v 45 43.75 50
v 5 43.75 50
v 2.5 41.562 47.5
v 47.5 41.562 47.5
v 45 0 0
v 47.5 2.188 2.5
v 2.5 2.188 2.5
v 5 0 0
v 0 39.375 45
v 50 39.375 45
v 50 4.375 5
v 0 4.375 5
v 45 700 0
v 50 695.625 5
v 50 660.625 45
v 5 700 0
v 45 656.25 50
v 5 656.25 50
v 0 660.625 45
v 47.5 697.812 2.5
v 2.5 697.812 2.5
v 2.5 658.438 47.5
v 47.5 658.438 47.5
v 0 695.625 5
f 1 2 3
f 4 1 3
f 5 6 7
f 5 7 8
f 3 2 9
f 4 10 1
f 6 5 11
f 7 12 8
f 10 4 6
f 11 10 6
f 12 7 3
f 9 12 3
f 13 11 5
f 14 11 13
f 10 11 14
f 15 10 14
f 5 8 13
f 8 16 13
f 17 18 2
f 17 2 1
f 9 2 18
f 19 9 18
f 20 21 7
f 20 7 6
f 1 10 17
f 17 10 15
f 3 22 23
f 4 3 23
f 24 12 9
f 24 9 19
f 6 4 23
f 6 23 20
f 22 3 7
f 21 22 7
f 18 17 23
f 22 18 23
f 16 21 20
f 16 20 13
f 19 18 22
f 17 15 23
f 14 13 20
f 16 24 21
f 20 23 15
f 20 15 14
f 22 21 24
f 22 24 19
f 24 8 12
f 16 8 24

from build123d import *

# Parameters (mm, degrees)
SKETCH1_W           = 50
SKETCH1_H           = 700
BOSS_EXTRUDE1_DEPTH = 50
SKETCH2_W           = 45
SKETCH2_H           = 45
CUT_EXTRUDE1_DEPTH  = 704.562363974
CUT_EXTRUDE2_DEPTH  = 704.562363974
CHAMFER1_SIZE       = 5


with BuildPart() as part:
    # Sketch1 → Boss-Extrude1 (new body)
    with BuildSketch(Plane.XY):
        with Locations((25, 350)):
            Rectangle(SKETCH1_W, SKETCH1_H)
    extrude(amount=BOSS_EXTRUDE1_DEPTH)

    # Sketch2 → Cut-Extrude1 (cut, through all)
    with BuildSketch(Plane(origin=(0, 700, 0), x_dir=(1, 0, 0), z_dir=(0, 1, 0))):
        with Locations((25, -25)):
            Rectangle(SKETCH2_W, SKETCH2_H)
    extrude(amount=-CUT_EXTRUDE1_DEPTH, mode=Mode.SUBTRACT)

    # Sketch3 → Cut-Extrude2 (cut, through all)
    with BuildSketch(Plane.ZY):
        Polygon((0, 700), (50, 700), (50, 656.25), align=None)
        Polygon((0, 0), (50, 0), (50, 43.75), align=None)
    extrude(amount=-CUT_EXTRUDE2_DEPTH, mode=Mode.SUBTRACT)

    # Chamfer1
    chamfer1_edges = [part.edges().sort_by_distance(p)[0] for p in [
        (0, 350, 50),
        (50, 350, 50),
        (0, 350, 0),
        (50, 350, 0),
    ]]
    chamfer(chamfer1_edges, length=CHAMFER1_SIZE - 0.0001)  # a hair under: the kernel refuses the full size


solid = part.part
